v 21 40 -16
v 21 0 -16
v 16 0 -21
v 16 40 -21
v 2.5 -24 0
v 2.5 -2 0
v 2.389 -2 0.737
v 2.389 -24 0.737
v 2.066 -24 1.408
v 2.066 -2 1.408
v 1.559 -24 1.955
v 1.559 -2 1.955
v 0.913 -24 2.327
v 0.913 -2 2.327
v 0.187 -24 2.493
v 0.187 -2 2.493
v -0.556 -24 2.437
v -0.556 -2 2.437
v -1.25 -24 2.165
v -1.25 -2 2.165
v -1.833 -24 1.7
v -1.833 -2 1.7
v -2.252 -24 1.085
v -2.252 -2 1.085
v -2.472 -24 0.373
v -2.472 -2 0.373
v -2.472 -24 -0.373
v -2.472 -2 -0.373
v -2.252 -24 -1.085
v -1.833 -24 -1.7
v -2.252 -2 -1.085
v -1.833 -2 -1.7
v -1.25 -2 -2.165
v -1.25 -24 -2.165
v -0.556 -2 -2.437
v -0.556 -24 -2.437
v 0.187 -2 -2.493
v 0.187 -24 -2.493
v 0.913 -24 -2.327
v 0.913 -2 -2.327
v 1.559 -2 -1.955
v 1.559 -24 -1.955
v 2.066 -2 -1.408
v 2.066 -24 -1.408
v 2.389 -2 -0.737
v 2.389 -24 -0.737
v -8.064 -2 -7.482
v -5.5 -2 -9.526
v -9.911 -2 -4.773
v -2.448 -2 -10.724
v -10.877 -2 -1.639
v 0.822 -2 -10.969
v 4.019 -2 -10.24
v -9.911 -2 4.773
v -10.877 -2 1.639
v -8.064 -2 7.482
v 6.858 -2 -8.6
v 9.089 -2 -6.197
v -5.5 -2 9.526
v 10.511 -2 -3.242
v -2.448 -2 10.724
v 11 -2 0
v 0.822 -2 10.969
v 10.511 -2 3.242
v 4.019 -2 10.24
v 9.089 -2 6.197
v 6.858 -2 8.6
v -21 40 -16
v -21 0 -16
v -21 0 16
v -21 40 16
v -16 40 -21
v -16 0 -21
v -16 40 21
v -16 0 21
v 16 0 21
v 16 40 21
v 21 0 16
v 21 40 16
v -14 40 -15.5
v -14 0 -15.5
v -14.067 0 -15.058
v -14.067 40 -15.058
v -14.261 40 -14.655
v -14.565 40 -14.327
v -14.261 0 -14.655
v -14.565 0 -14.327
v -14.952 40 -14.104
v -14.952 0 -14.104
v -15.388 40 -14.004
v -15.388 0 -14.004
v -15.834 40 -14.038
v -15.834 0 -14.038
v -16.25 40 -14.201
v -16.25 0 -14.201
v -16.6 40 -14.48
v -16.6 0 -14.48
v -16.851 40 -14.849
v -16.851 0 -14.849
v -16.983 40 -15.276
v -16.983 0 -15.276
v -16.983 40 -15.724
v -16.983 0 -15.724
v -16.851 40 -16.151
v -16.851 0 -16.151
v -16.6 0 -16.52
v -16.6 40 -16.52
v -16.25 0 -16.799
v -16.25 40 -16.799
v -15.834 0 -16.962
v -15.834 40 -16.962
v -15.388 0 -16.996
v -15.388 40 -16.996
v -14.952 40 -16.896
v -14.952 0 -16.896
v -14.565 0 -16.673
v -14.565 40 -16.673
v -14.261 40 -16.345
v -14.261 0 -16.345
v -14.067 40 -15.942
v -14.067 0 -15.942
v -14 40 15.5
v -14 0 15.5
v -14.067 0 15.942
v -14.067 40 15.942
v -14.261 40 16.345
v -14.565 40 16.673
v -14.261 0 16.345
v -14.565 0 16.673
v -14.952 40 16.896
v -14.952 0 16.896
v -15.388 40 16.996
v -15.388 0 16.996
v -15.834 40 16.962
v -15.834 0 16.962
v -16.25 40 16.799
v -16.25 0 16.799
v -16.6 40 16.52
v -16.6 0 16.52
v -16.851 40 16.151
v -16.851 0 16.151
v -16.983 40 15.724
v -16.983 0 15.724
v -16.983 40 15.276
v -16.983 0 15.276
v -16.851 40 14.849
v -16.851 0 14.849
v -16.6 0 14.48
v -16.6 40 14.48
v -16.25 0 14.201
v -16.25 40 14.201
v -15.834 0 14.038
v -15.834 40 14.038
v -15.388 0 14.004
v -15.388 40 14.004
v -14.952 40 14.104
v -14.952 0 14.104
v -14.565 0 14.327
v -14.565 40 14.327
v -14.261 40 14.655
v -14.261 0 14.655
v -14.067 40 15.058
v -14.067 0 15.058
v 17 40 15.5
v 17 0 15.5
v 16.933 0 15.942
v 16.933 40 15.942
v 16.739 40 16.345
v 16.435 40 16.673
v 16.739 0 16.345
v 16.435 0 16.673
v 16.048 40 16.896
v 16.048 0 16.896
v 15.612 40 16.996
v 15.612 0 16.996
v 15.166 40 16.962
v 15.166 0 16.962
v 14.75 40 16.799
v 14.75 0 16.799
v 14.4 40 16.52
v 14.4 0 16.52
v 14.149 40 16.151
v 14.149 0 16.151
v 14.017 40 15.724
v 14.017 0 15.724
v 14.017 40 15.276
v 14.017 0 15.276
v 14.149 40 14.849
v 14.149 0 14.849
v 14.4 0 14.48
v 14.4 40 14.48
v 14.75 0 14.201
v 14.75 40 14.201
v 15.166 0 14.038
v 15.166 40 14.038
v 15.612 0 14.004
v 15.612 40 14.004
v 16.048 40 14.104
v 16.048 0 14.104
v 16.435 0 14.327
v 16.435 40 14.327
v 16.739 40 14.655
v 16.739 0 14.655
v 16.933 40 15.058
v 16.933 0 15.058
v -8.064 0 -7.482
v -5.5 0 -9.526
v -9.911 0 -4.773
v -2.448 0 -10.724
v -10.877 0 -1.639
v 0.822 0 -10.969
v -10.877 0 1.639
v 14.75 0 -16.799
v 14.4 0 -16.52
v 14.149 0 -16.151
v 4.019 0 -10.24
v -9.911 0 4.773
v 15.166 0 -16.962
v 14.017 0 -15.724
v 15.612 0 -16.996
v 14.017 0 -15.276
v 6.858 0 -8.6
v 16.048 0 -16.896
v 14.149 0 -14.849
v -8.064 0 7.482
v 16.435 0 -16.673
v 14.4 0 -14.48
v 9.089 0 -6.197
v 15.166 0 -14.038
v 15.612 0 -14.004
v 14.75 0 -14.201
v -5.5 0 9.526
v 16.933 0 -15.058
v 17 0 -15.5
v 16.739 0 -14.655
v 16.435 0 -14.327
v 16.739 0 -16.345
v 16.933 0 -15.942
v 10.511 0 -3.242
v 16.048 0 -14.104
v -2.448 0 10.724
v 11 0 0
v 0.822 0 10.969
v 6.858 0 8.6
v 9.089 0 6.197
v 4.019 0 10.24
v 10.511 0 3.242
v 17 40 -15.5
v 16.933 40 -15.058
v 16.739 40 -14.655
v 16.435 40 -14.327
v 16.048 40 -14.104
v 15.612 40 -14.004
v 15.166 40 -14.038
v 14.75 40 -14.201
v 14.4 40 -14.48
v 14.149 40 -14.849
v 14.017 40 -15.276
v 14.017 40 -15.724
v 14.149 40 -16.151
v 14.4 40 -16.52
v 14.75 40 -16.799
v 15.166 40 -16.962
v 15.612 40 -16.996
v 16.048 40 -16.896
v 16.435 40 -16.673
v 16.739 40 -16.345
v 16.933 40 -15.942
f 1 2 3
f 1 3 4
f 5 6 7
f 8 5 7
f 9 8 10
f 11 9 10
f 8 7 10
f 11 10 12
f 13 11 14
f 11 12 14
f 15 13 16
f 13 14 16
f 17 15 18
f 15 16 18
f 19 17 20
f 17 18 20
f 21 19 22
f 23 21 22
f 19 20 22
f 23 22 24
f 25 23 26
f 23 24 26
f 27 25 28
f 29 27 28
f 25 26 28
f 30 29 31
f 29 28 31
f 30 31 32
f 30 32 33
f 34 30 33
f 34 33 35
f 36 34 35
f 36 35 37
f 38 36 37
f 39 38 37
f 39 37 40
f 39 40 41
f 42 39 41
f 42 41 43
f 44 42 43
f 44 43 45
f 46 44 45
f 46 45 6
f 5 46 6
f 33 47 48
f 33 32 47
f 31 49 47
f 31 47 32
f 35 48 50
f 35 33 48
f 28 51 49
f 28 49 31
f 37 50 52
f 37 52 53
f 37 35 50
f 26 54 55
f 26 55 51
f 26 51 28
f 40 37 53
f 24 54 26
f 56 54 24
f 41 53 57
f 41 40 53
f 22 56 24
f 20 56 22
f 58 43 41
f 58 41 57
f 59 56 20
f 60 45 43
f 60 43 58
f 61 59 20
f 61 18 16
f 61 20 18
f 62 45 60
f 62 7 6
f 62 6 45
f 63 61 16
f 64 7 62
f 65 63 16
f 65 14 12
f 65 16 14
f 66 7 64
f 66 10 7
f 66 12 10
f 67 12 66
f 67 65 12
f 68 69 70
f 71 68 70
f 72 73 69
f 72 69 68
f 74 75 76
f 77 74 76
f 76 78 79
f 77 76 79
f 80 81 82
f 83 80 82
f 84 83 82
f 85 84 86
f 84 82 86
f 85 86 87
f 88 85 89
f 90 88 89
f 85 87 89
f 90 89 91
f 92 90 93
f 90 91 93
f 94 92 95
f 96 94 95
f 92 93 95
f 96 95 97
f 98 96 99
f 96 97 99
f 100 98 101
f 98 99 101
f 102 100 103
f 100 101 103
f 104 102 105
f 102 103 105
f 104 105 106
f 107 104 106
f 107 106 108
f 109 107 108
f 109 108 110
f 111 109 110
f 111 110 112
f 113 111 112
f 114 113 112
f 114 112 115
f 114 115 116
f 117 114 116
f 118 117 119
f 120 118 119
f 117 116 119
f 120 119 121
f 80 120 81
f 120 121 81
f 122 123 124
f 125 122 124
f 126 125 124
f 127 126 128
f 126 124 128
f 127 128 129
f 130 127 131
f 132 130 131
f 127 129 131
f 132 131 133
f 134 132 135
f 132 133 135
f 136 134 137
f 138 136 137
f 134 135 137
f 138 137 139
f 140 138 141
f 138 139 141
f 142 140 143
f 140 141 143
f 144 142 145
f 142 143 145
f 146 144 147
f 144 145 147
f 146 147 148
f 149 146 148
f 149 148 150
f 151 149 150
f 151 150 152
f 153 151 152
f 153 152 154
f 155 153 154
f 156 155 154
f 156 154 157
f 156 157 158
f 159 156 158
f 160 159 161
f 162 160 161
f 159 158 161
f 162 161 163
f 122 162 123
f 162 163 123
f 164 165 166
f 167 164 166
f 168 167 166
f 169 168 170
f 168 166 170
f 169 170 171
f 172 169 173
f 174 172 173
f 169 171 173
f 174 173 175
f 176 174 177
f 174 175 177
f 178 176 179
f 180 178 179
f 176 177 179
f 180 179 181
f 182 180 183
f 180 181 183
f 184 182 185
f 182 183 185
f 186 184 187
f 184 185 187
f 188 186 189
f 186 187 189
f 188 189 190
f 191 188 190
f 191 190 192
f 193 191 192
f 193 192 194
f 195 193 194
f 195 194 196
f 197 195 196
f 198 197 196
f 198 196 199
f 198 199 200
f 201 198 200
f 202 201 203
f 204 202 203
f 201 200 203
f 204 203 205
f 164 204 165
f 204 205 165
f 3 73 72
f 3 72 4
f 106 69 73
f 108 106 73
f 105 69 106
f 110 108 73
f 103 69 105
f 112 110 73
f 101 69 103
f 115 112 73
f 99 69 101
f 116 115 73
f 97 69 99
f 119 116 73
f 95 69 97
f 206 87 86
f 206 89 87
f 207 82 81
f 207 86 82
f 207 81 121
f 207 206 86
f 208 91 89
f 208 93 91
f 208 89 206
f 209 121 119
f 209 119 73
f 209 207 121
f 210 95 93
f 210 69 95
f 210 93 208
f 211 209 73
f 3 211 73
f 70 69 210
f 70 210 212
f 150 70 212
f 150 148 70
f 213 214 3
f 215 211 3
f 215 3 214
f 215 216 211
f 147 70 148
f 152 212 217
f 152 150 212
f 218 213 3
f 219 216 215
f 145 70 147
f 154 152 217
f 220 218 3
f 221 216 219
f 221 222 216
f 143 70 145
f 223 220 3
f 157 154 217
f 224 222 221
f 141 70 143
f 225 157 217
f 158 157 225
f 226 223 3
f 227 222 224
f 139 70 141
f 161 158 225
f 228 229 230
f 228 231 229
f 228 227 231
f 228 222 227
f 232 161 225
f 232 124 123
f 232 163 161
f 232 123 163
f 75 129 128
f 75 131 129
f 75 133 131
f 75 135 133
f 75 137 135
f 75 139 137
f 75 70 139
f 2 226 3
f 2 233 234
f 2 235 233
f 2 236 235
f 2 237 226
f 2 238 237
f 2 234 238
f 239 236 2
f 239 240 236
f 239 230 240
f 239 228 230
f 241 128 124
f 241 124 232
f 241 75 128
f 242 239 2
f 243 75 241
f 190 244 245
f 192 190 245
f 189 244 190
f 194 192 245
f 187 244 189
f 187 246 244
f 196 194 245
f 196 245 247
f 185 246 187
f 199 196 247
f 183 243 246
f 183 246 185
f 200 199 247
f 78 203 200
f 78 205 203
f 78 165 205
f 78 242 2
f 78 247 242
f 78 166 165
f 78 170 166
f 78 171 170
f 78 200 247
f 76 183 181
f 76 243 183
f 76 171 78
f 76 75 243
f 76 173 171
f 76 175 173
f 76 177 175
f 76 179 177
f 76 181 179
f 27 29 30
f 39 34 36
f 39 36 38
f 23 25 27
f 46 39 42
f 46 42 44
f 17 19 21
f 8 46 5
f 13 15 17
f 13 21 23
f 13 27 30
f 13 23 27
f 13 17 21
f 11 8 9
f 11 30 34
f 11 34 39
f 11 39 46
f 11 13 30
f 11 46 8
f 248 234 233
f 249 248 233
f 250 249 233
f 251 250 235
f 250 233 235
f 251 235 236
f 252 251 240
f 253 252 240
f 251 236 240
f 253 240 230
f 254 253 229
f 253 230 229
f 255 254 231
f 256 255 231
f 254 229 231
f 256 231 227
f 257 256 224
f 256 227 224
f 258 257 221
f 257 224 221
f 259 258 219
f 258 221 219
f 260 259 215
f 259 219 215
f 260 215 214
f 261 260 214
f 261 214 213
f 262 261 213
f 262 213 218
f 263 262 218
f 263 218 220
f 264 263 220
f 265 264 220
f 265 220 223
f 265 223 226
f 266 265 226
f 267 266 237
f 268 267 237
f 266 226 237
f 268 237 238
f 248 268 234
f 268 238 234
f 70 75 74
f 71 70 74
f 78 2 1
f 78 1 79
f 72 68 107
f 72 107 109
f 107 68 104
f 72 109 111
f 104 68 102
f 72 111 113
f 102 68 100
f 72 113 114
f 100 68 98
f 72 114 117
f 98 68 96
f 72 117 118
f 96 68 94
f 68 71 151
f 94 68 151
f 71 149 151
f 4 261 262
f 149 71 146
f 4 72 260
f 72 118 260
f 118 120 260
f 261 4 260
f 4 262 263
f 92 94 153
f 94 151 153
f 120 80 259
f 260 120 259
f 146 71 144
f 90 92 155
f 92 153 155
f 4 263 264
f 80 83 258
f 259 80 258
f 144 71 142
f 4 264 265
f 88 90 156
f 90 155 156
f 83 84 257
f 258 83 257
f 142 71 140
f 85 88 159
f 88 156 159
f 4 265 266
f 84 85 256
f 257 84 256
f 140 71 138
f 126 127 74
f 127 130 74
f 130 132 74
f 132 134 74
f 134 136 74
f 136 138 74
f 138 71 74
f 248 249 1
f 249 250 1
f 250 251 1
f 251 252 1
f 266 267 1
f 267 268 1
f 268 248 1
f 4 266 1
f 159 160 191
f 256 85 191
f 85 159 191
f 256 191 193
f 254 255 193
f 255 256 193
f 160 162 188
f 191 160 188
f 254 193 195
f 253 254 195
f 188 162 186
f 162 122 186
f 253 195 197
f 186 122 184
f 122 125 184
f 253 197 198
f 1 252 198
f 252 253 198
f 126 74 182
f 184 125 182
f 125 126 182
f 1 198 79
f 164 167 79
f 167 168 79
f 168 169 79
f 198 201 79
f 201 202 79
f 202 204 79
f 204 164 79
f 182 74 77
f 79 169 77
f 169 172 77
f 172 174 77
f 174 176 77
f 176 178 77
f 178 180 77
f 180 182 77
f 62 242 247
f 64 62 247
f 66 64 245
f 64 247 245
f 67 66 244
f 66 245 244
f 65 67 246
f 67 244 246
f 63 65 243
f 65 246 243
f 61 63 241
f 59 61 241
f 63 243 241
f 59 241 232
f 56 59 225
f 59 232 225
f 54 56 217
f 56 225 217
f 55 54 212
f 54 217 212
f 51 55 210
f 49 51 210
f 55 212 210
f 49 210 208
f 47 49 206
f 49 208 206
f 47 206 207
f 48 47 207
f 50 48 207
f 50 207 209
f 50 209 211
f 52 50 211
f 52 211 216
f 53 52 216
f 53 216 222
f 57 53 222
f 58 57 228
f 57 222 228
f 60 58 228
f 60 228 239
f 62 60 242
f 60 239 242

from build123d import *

# Parameters (mm, degrees)
F0_W     = 42
F0_H     = 42
F0_R     = 1.5
F0_R_2   = 11
F0_R_3   = 2.5
F1_DEPTH = 40
F2_DEPTH = 2
F3_DEPTH = 24
F4_SIZE  = 5


with BuildPart() as f1:
    # F0 (on Front) → F1 (new body)
    with BuildSketch(Plane.XZ):
        Rectangle(F0_W, F0_H)
        with Locations((-15.5, -15.5)):
            Circle(F0_R, mode=Mode.SUBTRACT)
        with Locations((15.5, -15.5)):
            Circle(F0_R, mode=Mode.SUBTRACT)
        with Locations((-15.5, 15.5)):
            Circle(F0_R, mode=Mode.SUBTRACT)
        Circle(F0_R_2, mode=Mode.SUBTRACT)
        with Locations((15.5, 15.5)):
            Circle(F0_R, mode=Mode.SUBTRACT)
        Circle(F0_R_2)
        Circle(F0_R_3, mode=Mode.SUBTRACT)
        Circle(F0_R_3)
    extrude(amount=-F1_DEPTH)

    # F0 (on Front) → F2 (join)
    with BuildSketch(Plane.XZ):
        Circle(F0_R_2)
        Circle(F0_R_3, mode=Mode.SUBTRACT)
    extrude(amount=F2_DEPTH)

    # F0 (on Front) → F3 (join)
    with BuildSketch(Plane.XZ):
        Circle(F0_R_3)
    extrude(amount=F3_DEPTH)

    # F4
    f4_edges = [f1.edges().sort_by_distance(p)[0] for p in [
        (-21, 20, -21),
        (-21, 20, 21),
        (21, 20, 21),
        (21, 20, -21),
    ]]
    chamfer(f4_edges, length=F4_SIZE)


solid = f1.part
